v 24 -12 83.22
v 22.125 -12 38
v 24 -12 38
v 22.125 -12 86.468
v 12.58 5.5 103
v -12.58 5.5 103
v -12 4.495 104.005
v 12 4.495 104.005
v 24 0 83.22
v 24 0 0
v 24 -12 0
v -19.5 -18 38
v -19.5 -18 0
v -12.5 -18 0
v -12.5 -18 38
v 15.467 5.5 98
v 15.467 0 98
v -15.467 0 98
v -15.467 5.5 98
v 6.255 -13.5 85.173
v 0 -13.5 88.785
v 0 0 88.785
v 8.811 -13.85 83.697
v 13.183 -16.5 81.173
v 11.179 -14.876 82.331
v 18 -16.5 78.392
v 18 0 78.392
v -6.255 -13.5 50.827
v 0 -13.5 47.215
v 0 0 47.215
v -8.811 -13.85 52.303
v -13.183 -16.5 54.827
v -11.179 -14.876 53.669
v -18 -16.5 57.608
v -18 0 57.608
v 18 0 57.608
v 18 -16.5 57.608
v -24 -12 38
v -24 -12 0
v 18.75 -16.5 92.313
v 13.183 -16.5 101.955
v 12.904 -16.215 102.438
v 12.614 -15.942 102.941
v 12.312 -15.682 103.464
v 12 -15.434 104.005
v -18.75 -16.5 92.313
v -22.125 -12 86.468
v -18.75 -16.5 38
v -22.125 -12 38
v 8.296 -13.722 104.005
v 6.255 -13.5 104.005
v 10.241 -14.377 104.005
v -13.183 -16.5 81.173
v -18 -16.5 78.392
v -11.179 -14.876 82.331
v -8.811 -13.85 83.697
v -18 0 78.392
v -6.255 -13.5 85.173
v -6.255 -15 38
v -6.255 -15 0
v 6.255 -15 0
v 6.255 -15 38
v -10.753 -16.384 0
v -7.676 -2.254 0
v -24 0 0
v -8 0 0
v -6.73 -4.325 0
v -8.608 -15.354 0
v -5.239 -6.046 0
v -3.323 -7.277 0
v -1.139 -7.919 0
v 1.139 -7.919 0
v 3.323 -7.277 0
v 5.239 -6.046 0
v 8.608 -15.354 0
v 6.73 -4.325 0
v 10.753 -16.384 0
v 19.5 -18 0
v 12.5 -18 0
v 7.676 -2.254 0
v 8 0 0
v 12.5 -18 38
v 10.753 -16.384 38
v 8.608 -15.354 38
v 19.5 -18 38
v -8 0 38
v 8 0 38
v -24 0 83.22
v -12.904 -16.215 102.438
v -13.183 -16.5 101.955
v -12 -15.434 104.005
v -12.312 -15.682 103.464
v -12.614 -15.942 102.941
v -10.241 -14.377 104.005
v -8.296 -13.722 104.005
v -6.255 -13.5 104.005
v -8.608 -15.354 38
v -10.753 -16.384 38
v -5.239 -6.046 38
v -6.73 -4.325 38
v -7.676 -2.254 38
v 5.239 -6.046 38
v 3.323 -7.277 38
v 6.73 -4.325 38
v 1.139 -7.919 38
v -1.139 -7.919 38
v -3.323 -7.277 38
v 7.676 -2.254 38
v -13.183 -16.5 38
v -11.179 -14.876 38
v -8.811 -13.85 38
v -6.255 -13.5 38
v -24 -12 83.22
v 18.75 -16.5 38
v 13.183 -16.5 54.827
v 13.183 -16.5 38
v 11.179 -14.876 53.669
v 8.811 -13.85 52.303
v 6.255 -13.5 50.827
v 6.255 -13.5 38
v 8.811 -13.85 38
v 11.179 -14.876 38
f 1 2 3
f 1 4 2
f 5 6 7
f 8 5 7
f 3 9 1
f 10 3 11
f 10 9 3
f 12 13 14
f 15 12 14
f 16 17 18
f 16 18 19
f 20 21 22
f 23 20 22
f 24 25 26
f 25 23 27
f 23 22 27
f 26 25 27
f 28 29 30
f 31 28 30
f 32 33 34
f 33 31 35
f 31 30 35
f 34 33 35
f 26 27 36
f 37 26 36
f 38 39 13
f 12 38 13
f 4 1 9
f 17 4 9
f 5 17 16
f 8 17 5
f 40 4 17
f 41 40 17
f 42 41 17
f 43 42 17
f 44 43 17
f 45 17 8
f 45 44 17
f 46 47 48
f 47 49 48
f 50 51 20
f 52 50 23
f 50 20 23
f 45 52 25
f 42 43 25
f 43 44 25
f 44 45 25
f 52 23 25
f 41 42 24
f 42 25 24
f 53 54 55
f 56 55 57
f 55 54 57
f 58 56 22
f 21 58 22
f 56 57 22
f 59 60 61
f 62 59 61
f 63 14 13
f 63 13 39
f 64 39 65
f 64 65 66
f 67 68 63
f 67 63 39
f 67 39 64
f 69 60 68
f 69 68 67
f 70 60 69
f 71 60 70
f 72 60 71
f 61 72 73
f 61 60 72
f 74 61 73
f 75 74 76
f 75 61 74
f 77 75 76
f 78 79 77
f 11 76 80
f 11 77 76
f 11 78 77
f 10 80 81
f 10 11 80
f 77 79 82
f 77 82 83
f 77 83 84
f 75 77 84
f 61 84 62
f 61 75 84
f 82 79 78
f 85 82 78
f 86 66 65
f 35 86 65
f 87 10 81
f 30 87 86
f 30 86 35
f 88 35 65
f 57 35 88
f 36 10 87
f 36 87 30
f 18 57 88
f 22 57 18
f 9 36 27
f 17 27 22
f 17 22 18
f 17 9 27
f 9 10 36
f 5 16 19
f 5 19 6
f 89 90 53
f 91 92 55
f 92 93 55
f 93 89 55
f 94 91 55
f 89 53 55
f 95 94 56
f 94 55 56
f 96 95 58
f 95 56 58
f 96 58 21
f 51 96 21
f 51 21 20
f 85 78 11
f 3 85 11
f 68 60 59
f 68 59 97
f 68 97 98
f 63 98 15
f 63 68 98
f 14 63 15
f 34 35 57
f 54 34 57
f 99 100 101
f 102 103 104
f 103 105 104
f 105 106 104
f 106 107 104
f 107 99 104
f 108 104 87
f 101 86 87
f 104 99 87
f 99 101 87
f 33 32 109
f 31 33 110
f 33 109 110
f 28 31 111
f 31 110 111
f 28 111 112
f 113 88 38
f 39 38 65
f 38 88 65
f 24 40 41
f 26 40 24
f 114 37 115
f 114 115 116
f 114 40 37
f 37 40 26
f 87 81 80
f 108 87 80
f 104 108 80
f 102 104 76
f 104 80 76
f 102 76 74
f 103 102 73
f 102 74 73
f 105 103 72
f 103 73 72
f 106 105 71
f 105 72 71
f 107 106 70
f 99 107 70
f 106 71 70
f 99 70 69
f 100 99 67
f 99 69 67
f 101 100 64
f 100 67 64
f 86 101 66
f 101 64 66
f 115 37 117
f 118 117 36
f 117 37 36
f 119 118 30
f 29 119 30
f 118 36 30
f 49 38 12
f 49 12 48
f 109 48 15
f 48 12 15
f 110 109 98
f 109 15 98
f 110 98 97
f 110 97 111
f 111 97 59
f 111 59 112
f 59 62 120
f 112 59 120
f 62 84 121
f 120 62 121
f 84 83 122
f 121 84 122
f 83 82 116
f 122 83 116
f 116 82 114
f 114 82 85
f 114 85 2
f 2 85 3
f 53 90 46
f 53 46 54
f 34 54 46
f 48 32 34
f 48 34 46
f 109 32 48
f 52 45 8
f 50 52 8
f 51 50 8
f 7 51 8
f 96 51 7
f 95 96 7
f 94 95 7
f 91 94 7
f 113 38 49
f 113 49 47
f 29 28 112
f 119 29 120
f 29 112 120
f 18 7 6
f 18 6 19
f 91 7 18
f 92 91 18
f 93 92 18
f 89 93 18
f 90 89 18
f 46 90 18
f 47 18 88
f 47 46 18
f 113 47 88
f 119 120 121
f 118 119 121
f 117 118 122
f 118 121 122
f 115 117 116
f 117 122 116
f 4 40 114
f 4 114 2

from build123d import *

# Parameters (mm, degrees)
Y_KSEKLIK_EKSTR_ZYON1_DEPTH = 38
RADYUS3_R                   = 8
Y_KSEKLIK_EKSTR_ZYON2_DEPTH = 10
Y_KSEKLIK_EKSTR_ZYON3_DEPTH = 24
KES_EKSTR_ZYON1_DEPTH       = 68
KES_EKSTR_ZYON3_DEPTH       = 68
KES_EKSTR_ZYON3_DEPTH_BACK  = 68
KES_EKSTR_ZYON4_DEPTH       = 68
KES_EKSTR_ZYON7_DEPTH       = 68


with BuildPart() as part:
    # Çizim1 → Yükseklik-Ekstrüzyon1 (new body)
    with BuildSketch(Plane.XY):
        with BuildLine():
            Line((-8, 0), (-24, 0))
            Line((-24, 0), (-24, -12))
            Line((-24, -12), (-19.5, -18))
            Line((-19.5, -18), (-12.5, -18))
            Line((-12.5, -18), (-10.25, -15))
            Line((-10.25, -15), (10.25, -15))
            Line((10.25, -15), (12.5, -18))
            Line((12.5, -18), (19.5, -18))
            Line((19.5, -18), (24, -12))
            Line((24, -12), (24, 0))
            Line((24, 0), (8, 0))
            ThreePointArc((8, 0), (0, -8), (-8, 0))
        make_face()
    extrude(amount=Y_KSEKLIK_EKSTR_ZYON1_DEPTH)

    # Radyus3
    # the kernel refuses this fillet: 8 mm, written as the material it adds along each edge
    with BuildSketch(Plane(origin=(10.25, -15, 0), x_dir=(-1, 0, 0), z_dir=(0, 0, 1))) as radyus3_piece_1:
        with BuildLine():
            CenterArc((3.994997998, 8), RADYUS3_R, 218.682187453, 51.317812547)
            Line((-2.25, 3), (-2.37489996, 2.9))
            ThreePointArc((-2.37489996, 2.9), (-1.253, 1.404), (-0.128, -0.096))
            Line((-0.128, -0.096), (0, -0.16))
            Line((0, -0.16), (3.994997998, -0.16))
            Line((3.994997998, -0.16), (3.994997998, 0))
        make_face()
    extrude(amount=38)
    with BuildSketch(Plane(origin=(-10.25, -15, 0), x_dir=(-0.5999999999999978, -0.8000000000000017, 0), z_dir=(0, 0, 1))) as radyus3_piece_2:
        with BuildLine():
            CenterArc((4.003001201, 7.995998399), RADYUS3_R, 216.869897646, 51.317812547)
            Line((-2.396998799, 3.195998399), (-2.524998799, 3.099998399))
            Line((-2.524998799, 3.099998399), (-0.128, -0.096))
            Line((-0.128, -0.096), (0, -0.16))
            ThreePointArc((0, -0.16), (1.875, -0.16), (3.744939976, -0.159919968))
            Line((3.744939976, -0.159919968), (3.75, 0))
        make_face()
    extrude(amount=38)

    # Çizim2 → Yükseklik-Ekstrüzyon2 (add)
    with BuildSketch(Plane.XY.offset(38)):
        with BuildLine():
            Line((22.125, -12), (24, -12))
            Line((24, -12), (24, 0))
            Line((24, 0), (-24, 0))
            Line((-24, 0), (-24, -12))
            Line((-24, -12), (-22.125, -12))
            Line((-22.125, -12), (-18.75, -16.5))
            Line((-18.75, -16.5), (-13.183205232, -16.5))
            ThreePointArc((-13.183205232, -16.5), (-10.029919219, -14.282202113), (-6.255002002, -13.5))
            Line((-6.255002002, -13.5), (6.255002002, -13.5))
            ThreePointArc((6.255002002, -13.5), (10.029919219, -14.282202113), (13.183205232, -16.5))
            Line((13.183205232, -16.5), (18.75, -16.5))
            Line((18.75, -16.5), (22.125, -12))
        make_face()
    extrude(amount=Y_KSEKLIK_EKSTR_ZYON2_DEPTH)

    # Çizim4 → Yükseklik-Ekstrüzyon3 (add, symmetric)
    with BuildSketch(Plane(origin=(0, 0, 0), x_dir=(0, 0, -1), z_dir=(1, 0, 0))):
        Polygon((-109, -10.5), (-103, -16.5), (-48, -16.5), (-48, 0), (-98, 0), (-98, 5.5), (-103, 5.5), (-109, -0.5), align=None)
    extrude(amount=Y_KSEKLIK_EKSTR_ZYON3_DEPTH, both=True)

    # Çizim5 → Kes-Ekstrüzyon1 (cut)
    with BuildSketch(Plane(origin=(0, 0, 48), x_dir=(-1, 0, 0), z_dir=(0, 0, -1))):
        Polygon((24, -16.5), (24, -12), (22.125, -12), (18.75, -16.5), align=None)
    extrude(amount=-KES_EKSTR_ZYON1_DEPTH, mode=Mode.SUBTRACT)

    # Çizim6 → Kes-Ekstrüzyon3 (cut, two sides: drawn at the far end of the back side and taken through both)
    with BuildSketch(Plane(origin=(0, 0, 0), x_dir=(1, 0, 0), z_dir=(0, 1, 0)).offset(-KES_EKSTR_ZYON3_DEPTH_BACK)):
        Polygon((-24, -83.22), (-34.13268128, -83.22), (-34.13268128, -122.200491655), (32.816911355, -122.200491655), (32.816911355, -83.22), (24, -83.22), (12, -104.004609691), (-12, -104.004609691), align=None)
    extrude(amount=KES_EKSTR_ZYON3_DEPTH + KES_EKSTR_ZYON3_DEPTH_BACK, mode=Mode.SUBTRACT)

    # Çizim7 → Kes-Ekstrüzyon4 (cut)
    with BuildSketch(Plane(origin=(0, 0, 48), x_dir=(-1, 0, 0), z_dir=(0, 0, -1))):
        with BuildLine():
            Line((6.255002002, -13.5), (-6.255002002, -13.5))
            ThreePointArc((-6.255002002, -13.5), (-10.029919219, -14.282202113), (-13.183205232, -16.5))
            Line((-13.183205232, -16.5), (13.183205232, -16.5))
            ThreePointArc((13.183205232, -16.5), (10.029919219, -14.282202113), (6.255002002, -13.5))
        make_face()
        Polygon((-24, -16.5), (-18.75, -16.5), (-22.125, -12), (-24, -12), align=None)
    extrude(amount=-KES_EKSTR_ZYON4_DEPTH, mode=Mode.SUBTRACT)

    # Çizim9 → Kes-Ekstrüzyon7 (cut)
    with BuildSketch(Plane(origin=(0, 0, 0), x_dir=(1, 0, 0), z_dir=(0, 1, 0))):
        Polygon((0, -47.215390309), (-18, -57.607695155), (-18, -78.392304845), (0, -88.784609691), (18, -78.392304845), (18, -57.607695155), align=None)
    extrude(amount=-KES_EKSTR_ZYON7_DEPTH, mode=Mode.SUBTRACT)


solid = part.part
